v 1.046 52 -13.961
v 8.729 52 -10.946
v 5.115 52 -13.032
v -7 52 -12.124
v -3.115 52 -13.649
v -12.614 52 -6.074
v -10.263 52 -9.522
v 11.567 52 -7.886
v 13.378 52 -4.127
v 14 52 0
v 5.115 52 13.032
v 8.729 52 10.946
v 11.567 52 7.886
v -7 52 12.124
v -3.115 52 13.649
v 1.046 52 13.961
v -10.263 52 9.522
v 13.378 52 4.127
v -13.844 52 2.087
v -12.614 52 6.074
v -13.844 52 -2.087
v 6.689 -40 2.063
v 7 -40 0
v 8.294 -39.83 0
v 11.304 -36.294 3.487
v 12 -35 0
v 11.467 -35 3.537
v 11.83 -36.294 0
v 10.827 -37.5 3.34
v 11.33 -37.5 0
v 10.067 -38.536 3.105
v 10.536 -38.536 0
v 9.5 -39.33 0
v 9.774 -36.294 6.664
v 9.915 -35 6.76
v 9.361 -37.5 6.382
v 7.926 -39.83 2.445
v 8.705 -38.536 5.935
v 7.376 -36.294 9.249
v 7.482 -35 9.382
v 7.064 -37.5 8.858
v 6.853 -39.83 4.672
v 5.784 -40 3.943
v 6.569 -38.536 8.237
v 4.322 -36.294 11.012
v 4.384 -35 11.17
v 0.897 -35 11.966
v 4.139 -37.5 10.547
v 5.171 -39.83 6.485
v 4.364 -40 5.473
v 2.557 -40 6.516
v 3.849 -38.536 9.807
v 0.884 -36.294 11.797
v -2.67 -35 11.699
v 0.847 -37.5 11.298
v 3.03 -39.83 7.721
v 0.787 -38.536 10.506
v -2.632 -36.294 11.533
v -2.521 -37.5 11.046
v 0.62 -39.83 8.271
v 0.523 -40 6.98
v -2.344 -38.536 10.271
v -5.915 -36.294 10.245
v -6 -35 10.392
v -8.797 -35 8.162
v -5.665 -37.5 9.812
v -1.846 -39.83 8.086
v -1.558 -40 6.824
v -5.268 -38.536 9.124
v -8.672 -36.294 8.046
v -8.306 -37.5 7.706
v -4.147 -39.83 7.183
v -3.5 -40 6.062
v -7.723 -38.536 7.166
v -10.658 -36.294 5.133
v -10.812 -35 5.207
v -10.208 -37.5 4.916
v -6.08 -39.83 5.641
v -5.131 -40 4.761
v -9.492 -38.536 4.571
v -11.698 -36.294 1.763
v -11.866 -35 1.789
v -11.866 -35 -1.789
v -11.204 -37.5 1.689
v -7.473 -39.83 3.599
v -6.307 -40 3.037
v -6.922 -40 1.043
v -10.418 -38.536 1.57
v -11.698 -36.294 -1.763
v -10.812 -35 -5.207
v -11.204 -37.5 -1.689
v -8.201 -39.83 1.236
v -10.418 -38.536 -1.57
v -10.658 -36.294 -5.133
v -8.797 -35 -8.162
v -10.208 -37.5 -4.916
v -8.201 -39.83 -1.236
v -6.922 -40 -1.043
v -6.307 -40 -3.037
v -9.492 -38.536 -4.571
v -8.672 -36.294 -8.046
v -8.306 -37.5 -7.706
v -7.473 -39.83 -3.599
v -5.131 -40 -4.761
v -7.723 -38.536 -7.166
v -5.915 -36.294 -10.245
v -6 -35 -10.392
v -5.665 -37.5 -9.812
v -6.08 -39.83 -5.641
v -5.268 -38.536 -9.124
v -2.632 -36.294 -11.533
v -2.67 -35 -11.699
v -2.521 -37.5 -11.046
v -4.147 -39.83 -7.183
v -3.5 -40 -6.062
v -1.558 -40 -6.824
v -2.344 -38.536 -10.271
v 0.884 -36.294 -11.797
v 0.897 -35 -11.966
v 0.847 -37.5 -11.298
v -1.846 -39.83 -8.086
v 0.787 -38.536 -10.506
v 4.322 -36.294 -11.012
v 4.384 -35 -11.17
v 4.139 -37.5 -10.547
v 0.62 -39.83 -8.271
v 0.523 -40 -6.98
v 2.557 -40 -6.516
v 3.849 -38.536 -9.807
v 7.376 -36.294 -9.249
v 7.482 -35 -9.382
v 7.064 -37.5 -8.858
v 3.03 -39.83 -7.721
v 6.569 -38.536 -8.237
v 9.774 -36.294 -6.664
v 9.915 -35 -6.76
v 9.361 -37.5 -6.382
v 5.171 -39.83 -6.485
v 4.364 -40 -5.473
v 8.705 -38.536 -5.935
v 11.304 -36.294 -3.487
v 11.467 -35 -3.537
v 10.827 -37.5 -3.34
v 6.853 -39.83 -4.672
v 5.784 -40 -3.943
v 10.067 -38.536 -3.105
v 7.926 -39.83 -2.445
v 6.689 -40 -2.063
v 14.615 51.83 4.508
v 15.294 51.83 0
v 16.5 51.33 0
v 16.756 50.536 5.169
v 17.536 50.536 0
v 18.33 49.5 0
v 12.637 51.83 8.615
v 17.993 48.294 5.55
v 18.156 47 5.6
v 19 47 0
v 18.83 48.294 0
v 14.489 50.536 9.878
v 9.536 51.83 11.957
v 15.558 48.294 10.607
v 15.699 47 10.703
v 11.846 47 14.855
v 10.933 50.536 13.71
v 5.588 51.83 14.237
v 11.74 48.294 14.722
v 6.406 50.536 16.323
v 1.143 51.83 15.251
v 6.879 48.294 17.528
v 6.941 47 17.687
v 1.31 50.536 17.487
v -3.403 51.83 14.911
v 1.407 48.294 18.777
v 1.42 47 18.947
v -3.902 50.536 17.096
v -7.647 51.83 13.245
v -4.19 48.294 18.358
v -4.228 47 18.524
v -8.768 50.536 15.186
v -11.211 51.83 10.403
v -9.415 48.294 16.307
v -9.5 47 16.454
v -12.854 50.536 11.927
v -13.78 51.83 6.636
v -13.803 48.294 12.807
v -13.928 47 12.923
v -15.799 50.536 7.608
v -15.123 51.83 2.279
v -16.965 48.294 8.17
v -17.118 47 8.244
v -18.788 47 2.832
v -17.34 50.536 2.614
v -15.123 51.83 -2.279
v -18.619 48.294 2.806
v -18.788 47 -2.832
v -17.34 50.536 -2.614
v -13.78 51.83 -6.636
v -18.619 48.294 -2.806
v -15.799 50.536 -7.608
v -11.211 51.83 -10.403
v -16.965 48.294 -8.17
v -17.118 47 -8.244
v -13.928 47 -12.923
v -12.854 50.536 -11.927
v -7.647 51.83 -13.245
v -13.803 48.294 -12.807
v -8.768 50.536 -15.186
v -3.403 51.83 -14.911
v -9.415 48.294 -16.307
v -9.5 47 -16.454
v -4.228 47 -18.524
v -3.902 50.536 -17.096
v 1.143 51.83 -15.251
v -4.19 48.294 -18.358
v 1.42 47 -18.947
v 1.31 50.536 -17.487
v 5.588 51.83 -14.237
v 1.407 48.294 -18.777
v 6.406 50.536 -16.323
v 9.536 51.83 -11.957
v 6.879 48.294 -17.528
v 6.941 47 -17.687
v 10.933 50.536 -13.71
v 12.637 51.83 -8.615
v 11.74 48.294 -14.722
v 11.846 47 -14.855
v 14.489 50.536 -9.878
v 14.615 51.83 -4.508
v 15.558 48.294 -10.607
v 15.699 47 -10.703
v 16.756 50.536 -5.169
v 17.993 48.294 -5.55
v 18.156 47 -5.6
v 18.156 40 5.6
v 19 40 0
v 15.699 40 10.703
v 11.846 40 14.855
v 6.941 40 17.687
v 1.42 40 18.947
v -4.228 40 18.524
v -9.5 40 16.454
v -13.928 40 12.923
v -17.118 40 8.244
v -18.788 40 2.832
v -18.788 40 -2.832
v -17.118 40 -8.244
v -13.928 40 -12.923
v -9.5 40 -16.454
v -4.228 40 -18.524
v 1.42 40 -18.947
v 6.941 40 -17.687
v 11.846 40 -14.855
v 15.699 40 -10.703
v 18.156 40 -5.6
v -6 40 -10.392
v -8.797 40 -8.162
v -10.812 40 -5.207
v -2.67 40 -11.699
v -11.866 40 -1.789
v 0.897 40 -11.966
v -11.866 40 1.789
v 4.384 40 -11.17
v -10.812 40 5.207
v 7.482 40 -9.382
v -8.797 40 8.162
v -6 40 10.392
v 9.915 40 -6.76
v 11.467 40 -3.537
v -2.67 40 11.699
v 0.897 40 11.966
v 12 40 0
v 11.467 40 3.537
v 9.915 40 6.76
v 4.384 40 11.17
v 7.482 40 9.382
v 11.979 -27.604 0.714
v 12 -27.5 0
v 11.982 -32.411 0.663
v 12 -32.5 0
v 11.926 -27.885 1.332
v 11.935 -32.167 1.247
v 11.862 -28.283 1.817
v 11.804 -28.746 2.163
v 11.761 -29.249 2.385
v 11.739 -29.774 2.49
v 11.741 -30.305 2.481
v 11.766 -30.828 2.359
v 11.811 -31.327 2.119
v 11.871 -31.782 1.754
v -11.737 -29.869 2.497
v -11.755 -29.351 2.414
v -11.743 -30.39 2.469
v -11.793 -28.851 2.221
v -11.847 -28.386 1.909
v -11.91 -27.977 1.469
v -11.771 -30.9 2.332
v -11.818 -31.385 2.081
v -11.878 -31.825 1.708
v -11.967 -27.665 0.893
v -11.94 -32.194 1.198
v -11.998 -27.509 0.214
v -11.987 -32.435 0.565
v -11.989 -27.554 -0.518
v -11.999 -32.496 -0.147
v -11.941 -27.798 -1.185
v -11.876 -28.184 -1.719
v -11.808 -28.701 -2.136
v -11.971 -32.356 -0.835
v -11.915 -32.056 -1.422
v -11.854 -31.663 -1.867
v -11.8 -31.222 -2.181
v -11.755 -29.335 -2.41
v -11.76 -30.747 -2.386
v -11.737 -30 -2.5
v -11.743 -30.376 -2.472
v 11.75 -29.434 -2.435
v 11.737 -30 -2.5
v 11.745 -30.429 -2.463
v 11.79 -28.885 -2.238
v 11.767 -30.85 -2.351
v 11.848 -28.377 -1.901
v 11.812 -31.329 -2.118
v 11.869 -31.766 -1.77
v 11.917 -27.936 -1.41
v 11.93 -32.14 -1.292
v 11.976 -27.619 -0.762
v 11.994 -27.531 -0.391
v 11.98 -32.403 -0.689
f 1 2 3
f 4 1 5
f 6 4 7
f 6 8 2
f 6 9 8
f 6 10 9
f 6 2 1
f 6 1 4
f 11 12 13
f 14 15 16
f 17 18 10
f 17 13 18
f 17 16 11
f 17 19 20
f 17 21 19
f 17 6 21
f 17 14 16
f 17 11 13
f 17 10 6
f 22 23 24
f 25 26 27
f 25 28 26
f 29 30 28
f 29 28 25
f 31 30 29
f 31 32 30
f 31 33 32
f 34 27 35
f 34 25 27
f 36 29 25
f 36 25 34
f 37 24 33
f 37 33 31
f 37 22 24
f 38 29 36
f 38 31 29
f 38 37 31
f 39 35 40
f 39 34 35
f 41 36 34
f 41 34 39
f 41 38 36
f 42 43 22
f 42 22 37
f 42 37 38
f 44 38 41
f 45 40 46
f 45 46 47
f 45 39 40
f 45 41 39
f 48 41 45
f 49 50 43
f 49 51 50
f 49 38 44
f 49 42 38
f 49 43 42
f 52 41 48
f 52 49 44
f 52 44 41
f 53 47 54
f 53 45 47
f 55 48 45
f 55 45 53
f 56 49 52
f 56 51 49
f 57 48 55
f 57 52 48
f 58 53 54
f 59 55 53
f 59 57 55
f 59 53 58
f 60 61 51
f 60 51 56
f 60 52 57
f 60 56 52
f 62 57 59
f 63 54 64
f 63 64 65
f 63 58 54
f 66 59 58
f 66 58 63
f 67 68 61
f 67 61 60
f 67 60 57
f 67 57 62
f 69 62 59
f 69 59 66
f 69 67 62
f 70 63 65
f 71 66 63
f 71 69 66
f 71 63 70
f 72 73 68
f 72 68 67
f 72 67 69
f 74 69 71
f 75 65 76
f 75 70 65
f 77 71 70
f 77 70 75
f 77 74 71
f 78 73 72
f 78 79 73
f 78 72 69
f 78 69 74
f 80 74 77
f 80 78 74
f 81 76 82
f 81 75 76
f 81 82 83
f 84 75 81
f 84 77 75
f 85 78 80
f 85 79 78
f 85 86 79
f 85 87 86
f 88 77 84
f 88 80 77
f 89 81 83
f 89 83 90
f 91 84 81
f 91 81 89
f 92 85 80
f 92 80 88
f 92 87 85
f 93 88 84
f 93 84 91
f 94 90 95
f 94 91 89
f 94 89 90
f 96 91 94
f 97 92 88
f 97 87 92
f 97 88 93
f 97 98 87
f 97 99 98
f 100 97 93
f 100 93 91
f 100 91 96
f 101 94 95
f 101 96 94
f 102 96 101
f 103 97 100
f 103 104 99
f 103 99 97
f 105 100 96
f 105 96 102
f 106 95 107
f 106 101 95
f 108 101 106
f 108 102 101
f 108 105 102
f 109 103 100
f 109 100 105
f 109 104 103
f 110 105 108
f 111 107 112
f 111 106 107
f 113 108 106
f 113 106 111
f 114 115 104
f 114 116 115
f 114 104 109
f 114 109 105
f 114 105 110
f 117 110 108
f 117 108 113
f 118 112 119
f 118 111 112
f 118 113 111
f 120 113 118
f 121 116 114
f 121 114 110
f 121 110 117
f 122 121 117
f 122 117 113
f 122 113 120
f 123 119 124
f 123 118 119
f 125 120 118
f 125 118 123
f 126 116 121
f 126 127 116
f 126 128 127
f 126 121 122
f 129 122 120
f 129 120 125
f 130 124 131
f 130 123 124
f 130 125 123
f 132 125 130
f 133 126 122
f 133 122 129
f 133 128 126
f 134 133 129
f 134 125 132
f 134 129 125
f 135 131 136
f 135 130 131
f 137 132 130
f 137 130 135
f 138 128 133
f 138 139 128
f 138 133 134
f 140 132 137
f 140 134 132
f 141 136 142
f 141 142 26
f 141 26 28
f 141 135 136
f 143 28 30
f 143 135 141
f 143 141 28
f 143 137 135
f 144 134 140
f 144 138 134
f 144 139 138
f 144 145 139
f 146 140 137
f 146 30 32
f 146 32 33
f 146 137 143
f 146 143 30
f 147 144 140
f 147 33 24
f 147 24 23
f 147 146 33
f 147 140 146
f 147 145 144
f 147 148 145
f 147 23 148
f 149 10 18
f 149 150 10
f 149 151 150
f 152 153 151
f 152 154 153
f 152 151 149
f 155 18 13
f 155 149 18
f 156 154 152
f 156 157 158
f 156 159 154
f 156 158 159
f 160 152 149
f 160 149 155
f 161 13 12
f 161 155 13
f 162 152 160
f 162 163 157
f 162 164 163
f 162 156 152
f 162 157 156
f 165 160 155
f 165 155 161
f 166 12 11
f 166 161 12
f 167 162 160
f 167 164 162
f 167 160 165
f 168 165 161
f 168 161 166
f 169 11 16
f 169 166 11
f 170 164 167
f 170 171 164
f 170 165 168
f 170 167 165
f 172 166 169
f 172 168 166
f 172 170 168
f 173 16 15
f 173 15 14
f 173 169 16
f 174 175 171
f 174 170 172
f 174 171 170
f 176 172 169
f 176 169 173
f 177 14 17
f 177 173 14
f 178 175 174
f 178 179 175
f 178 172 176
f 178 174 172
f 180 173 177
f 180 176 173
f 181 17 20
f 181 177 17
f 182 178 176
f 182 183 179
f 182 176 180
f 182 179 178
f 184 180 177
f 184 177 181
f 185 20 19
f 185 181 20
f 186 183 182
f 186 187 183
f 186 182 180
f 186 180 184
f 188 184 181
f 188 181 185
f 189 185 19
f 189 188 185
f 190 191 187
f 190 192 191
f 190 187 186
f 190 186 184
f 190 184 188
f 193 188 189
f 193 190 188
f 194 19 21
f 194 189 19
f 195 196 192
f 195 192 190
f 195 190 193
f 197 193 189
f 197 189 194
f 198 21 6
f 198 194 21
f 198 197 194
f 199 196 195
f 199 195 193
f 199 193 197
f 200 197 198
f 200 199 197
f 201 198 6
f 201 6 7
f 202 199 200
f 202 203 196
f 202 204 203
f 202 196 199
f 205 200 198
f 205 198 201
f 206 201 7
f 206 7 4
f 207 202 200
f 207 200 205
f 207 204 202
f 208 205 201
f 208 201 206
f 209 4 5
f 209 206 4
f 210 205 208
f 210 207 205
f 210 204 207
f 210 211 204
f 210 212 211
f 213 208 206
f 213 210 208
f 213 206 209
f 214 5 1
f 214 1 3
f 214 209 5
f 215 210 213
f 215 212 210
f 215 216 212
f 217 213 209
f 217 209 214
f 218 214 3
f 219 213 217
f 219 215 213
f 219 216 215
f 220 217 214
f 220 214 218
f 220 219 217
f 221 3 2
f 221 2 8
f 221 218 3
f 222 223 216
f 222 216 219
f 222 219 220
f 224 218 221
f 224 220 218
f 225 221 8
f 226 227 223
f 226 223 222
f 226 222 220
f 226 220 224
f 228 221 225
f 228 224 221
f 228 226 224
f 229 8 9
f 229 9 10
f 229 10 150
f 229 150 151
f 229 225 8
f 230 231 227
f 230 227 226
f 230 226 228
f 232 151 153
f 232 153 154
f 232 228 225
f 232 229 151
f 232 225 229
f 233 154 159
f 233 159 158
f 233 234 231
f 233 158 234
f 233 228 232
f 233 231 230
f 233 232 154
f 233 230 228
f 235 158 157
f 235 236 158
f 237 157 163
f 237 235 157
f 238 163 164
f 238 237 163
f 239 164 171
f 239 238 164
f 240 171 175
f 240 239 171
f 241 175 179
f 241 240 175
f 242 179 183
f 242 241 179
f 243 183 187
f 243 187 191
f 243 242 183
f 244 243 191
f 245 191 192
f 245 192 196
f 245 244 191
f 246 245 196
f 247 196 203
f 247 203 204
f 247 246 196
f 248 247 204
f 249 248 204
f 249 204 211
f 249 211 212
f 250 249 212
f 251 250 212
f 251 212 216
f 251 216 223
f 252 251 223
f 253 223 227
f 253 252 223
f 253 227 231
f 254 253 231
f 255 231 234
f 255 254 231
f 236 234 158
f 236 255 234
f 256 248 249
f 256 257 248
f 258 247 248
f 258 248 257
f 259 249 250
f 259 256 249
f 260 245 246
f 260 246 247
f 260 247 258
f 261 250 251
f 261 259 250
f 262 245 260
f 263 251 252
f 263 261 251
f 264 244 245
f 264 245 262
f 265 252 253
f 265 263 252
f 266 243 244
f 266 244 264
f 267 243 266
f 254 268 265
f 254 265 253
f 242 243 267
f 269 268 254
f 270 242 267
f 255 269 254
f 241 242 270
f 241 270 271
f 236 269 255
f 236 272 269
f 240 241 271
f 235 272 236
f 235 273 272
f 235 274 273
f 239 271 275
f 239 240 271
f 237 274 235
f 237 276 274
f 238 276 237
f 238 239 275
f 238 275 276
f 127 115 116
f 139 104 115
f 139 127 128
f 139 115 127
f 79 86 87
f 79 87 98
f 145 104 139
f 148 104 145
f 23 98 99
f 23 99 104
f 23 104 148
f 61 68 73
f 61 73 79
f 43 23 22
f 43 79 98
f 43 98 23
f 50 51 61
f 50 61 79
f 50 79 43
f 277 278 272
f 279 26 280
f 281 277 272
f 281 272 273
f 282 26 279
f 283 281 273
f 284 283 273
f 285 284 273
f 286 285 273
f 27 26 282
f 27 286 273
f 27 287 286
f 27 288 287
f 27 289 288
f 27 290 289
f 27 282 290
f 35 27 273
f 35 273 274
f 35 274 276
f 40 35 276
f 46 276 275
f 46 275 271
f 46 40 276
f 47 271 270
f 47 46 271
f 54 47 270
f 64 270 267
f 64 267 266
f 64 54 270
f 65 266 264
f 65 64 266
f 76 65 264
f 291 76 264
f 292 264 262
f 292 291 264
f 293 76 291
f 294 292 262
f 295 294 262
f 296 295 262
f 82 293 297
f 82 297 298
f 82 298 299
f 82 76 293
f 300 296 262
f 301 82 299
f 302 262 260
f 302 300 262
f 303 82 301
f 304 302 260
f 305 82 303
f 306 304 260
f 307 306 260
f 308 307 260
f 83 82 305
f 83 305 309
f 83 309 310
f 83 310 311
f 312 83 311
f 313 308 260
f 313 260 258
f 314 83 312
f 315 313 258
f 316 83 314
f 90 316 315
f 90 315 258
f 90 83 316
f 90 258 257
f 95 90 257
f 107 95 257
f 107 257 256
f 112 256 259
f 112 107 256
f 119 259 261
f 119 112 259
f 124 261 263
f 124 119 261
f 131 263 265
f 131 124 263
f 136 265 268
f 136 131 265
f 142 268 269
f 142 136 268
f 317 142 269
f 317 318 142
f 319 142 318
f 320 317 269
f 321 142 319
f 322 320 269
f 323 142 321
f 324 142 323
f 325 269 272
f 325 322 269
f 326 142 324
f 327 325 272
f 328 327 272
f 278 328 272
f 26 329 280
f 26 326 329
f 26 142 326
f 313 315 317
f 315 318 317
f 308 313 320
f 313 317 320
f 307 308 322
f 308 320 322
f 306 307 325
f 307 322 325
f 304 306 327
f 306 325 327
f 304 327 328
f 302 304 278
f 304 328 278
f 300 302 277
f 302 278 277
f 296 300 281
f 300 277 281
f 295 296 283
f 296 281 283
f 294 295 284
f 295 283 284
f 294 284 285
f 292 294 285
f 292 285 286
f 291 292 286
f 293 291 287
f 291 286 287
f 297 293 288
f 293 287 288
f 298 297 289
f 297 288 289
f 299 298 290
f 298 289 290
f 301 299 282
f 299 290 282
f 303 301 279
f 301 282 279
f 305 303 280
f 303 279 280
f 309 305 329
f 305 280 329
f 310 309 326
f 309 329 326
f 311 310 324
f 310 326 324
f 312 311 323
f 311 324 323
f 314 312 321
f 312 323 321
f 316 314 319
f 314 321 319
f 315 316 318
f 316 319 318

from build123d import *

# Parameters (mm, degrees)
SKETCH5_R          = 2.5
CUT_EXTRUDE1_DEPTH = 35


with BuildPart() as part:
    # Sketch1 → Revolve3 (revolve)
    with BuildSketch(Plane.XY):
        with BuildLine():
            Line((0, 52), (14, 52))
            ThreePointArc((14, 52), (17.535533906, 50.535533906), (19, 47))
            Line((19, 47), (19, 40))
            Line((19, 40), (12, 40))
            Line((12, 40), (12, -35))
            ThreePointArc((12, -35), (10.535533906, -38.535533906), (7, -40))
            Line((7, -40), (0, -40))
            Line((0, -40), (0, 52))
        make_face()
    revolve(axis=Axis((0, 87.076923077, 0), (0, -1, 0)))

    # Sketch5 → Cut-Extrude1 (cut, symmetric)
    with BuildSketch(Plane(origin=(0, 0, 0), x_dir=(0, 0, -1), z_dir=(1, 0, 0))):
        with Locations((0, -30)):
            Circle(SKETCH5_R)
    extrude(amount=CUT_EXTRUDE1_DEPTH, both=True, mode=Mode.SUBTRACT)


solid = part.part
